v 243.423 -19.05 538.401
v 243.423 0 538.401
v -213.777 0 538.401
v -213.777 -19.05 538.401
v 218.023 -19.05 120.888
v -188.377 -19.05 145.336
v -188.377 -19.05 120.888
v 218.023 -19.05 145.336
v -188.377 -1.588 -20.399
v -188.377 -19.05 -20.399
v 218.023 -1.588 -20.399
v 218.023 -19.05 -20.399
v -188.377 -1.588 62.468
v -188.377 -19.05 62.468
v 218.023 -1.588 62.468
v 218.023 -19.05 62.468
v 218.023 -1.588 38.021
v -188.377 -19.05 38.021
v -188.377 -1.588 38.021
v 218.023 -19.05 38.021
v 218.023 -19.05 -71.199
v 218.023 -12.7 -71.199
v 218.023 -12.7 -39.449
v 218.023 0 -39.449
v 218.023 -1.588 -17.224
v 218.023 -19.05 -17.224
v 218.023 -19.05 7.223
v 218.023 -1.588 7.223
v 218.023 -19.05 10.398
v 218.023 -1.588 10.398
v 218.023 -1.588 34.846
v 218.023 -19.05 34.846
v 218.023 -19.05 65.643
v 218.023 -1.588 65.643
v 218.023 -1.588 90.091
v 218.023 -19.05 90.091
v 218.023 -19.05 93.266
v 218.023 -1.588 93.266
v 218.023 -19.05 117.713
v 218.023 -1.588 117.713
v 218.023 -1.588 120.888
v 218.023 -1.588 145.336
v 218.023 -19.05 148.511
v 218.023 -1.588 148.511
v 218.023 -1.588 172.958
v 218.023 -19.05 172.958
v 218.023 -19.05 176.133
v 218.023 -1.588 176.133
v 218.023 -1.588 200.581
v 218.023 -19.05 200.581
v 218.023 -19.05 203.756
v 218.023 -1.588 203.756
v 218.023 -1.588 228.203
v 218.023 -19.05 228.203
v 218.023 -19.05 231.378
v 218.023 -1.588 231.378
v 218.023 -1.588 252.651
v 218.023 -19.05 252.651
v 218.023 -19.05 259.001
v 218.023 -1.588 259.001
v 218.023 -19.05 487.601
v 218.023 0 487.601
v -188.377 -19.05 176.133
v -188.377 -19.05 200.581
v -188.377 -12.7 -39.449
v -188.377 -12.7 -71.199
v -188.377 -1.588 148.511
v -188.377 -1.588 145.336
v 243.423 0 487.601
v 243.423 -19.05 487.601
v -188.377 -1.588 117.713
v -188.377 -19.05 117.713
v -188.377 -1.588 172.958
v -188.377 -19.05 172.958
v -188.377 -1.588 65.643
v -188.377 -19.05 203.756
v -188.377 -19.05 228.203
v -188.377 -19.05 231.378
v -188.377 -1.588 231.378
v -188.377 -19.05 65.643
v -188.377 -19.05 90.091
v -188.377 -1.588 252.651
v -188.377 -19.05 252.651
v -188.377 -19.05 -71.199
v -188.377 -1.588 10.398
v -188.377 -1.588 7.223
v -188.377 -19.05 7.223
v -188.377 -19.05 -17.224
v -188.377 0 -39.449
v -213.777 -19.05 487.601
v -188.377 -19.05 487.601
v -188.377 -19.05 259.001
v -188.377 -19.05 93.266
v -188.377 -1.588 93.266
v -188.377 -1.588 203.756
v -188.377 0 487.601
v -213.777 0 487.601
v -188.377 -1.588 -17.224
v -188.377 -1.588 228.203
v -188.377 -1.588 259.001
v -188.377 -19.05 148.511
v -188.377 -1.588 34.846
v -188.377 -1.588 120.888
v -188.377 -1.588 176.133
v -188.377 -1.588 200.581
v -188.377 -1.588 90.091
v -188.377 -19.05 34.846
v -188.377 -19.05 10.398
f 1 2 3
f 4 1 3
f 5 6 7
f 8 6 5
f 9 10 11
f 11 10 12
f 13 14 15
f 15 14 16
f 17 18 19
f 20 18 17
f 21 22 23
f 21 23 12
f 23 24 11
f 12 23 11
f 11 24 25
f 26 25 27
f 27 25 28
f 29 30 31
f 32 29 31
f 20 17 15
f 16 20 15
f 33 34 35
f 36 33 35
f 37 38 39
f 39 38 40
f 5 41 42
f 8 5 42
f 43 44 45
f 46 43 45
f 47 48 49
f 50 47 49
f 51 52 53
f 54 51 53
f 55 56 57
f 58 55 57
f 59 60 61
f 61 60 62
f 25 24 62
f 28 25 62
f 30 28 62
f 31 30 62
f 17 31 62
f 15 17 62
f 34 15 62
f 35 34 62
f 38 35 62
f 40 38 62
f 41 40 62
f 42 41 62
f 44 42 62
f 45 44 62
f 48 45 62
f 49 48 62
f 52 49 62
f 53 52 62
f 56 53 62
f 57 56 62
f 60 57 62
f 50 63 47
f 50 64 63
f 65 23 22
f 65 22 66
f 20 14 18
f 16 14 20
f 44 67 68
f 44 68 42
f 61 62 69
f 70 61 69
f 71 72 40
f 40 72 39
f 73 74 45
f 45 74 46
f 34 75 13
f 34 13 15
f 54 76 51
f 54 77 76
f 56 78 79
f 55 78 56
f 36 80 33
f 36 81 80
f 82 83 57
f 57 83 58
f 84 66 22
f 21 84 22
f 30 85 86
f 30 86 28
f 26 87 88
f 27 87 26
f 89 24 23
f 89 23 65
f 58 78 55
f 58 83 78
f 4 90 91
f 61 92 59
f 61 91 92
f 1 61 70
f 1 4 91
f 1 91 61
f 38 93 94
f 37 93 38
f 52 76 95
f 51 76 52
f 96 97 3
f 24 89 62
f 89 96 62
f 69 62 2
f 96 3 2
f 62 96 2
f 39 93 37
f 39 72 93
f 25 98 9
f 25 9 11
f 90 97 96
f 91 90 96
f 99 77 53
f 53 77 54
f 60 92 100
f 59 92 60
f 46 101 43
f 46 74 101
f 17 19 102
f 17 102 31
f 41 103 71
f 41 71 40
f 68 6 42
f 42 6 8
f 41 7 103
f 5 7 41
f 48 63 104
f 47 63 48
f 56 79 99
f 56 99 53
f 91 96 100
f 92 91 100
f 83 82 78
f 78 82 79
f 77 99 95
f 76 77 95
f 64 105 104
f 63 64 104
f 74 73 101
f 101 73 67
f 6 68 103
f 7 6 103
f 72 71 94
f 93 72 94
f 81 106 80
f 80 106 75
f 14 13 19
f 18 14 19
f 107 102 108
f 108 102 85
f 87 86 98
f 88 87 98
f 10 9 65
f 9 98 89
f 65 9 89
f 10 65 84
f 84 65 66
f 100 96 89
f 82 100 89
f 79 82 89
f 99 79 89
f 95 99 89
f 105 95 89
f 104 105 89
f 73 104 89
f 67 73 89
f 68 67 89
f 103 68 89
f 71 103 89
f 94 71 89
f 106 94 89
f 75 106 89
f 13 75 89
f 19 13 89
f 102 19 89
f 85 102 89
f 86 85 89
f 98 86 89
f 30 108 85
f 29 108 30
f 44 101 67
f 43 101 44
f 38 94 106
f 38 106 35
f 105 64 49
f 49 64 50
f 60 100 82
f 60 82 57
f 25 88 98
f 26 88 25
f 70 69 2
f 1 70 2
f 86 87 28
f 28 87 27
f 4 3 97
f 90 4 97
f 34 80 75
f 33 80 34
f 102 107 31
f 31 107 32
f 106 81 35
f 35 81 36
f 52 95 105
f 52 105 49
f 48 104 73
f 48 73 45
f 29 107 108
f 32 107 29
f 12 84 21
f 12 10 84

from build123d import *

# Parameters (mm, degrees)
F1_DEPTH = 19.05
F2_W     = 406.4
F2_H     = 3.175
F3_DEPTH = 17.4625
F4_W     = 406.4
F4_H     = 31.75
F5_DEPTH = 12.7


with BuildPart() as f1:
    # F0 (on Front) → F1 (new body)
    with BuildSketch(Plane.XZ):
        Polygon((218.022645, -71.199347), (218.022645, 487.600653), (243.422645, 487.600653), (243.422645, 538.400653), (-213.777355, 538.400653), (-213.777355, 487.600653), (-188.377355, 487.600653), (-188.377355, -71.199347), align=None)
    extrude(amount=F1_DEPTH)

    # F2 (on face) → F3 (cut)
    with BuildSketch(Plane.XZ.offset(19.05)):
        with Locations((14.822645, 257.413153)):
            Rectangle(F2_W, F2_H)
        with Locations((14.822645, 229.790653)):
            Rectangle(F2_W, F2_H)
        with Locations((14.822645, 254.238153)):
            Rectangle(F2_W, F2_H)
        with Locations((14.822645, 202.168153)):
            Rectangle(F2_W, F2_H)
        with Locations((14.822645, 174.545653)):
            Rectangle(F2_W, F2_H)
        with Locations((14.822645, 146.923153)):
            Rectangle(F2_W, F2_H)
        with Locations((14.822645, 119.300653)):
            Rectangle(F2_W, F2_H)
        with Locations((14.822645, 91.678153)):
            Rectangle(F2_W, F2_H)
        with Locations((14.822645, 64.055653)):
            Rectangle(F2_W, F2_H)
        with Locations((14.822645, 36.433153)):
            Rectangle(F2_W, F2_H)
        with Locations((14.822645, 8.810653)):
            Rectangle(F2_W, F2_H)
        with Locations((14.822645, -18.811847)):
            Rectangle(F2_W, F2_H)
    extrude(amount=-F3_DEPTH, mode=Mode.SUBTRACT)

    # F4 (on face) → F5 (cut)
    with BuildSketch(Plane(origin=(0, 0, 0), x_dir=(-1, 0, 0), z_dir=(0, 1, 0))):
        with Locations((-14.822645, -55.324347)):
            Rectangle(F4_W, F4_H)
    extrude(amount=-F5_DEPTH, mode=Mode.SUBTRACT)


solid = f1.part
